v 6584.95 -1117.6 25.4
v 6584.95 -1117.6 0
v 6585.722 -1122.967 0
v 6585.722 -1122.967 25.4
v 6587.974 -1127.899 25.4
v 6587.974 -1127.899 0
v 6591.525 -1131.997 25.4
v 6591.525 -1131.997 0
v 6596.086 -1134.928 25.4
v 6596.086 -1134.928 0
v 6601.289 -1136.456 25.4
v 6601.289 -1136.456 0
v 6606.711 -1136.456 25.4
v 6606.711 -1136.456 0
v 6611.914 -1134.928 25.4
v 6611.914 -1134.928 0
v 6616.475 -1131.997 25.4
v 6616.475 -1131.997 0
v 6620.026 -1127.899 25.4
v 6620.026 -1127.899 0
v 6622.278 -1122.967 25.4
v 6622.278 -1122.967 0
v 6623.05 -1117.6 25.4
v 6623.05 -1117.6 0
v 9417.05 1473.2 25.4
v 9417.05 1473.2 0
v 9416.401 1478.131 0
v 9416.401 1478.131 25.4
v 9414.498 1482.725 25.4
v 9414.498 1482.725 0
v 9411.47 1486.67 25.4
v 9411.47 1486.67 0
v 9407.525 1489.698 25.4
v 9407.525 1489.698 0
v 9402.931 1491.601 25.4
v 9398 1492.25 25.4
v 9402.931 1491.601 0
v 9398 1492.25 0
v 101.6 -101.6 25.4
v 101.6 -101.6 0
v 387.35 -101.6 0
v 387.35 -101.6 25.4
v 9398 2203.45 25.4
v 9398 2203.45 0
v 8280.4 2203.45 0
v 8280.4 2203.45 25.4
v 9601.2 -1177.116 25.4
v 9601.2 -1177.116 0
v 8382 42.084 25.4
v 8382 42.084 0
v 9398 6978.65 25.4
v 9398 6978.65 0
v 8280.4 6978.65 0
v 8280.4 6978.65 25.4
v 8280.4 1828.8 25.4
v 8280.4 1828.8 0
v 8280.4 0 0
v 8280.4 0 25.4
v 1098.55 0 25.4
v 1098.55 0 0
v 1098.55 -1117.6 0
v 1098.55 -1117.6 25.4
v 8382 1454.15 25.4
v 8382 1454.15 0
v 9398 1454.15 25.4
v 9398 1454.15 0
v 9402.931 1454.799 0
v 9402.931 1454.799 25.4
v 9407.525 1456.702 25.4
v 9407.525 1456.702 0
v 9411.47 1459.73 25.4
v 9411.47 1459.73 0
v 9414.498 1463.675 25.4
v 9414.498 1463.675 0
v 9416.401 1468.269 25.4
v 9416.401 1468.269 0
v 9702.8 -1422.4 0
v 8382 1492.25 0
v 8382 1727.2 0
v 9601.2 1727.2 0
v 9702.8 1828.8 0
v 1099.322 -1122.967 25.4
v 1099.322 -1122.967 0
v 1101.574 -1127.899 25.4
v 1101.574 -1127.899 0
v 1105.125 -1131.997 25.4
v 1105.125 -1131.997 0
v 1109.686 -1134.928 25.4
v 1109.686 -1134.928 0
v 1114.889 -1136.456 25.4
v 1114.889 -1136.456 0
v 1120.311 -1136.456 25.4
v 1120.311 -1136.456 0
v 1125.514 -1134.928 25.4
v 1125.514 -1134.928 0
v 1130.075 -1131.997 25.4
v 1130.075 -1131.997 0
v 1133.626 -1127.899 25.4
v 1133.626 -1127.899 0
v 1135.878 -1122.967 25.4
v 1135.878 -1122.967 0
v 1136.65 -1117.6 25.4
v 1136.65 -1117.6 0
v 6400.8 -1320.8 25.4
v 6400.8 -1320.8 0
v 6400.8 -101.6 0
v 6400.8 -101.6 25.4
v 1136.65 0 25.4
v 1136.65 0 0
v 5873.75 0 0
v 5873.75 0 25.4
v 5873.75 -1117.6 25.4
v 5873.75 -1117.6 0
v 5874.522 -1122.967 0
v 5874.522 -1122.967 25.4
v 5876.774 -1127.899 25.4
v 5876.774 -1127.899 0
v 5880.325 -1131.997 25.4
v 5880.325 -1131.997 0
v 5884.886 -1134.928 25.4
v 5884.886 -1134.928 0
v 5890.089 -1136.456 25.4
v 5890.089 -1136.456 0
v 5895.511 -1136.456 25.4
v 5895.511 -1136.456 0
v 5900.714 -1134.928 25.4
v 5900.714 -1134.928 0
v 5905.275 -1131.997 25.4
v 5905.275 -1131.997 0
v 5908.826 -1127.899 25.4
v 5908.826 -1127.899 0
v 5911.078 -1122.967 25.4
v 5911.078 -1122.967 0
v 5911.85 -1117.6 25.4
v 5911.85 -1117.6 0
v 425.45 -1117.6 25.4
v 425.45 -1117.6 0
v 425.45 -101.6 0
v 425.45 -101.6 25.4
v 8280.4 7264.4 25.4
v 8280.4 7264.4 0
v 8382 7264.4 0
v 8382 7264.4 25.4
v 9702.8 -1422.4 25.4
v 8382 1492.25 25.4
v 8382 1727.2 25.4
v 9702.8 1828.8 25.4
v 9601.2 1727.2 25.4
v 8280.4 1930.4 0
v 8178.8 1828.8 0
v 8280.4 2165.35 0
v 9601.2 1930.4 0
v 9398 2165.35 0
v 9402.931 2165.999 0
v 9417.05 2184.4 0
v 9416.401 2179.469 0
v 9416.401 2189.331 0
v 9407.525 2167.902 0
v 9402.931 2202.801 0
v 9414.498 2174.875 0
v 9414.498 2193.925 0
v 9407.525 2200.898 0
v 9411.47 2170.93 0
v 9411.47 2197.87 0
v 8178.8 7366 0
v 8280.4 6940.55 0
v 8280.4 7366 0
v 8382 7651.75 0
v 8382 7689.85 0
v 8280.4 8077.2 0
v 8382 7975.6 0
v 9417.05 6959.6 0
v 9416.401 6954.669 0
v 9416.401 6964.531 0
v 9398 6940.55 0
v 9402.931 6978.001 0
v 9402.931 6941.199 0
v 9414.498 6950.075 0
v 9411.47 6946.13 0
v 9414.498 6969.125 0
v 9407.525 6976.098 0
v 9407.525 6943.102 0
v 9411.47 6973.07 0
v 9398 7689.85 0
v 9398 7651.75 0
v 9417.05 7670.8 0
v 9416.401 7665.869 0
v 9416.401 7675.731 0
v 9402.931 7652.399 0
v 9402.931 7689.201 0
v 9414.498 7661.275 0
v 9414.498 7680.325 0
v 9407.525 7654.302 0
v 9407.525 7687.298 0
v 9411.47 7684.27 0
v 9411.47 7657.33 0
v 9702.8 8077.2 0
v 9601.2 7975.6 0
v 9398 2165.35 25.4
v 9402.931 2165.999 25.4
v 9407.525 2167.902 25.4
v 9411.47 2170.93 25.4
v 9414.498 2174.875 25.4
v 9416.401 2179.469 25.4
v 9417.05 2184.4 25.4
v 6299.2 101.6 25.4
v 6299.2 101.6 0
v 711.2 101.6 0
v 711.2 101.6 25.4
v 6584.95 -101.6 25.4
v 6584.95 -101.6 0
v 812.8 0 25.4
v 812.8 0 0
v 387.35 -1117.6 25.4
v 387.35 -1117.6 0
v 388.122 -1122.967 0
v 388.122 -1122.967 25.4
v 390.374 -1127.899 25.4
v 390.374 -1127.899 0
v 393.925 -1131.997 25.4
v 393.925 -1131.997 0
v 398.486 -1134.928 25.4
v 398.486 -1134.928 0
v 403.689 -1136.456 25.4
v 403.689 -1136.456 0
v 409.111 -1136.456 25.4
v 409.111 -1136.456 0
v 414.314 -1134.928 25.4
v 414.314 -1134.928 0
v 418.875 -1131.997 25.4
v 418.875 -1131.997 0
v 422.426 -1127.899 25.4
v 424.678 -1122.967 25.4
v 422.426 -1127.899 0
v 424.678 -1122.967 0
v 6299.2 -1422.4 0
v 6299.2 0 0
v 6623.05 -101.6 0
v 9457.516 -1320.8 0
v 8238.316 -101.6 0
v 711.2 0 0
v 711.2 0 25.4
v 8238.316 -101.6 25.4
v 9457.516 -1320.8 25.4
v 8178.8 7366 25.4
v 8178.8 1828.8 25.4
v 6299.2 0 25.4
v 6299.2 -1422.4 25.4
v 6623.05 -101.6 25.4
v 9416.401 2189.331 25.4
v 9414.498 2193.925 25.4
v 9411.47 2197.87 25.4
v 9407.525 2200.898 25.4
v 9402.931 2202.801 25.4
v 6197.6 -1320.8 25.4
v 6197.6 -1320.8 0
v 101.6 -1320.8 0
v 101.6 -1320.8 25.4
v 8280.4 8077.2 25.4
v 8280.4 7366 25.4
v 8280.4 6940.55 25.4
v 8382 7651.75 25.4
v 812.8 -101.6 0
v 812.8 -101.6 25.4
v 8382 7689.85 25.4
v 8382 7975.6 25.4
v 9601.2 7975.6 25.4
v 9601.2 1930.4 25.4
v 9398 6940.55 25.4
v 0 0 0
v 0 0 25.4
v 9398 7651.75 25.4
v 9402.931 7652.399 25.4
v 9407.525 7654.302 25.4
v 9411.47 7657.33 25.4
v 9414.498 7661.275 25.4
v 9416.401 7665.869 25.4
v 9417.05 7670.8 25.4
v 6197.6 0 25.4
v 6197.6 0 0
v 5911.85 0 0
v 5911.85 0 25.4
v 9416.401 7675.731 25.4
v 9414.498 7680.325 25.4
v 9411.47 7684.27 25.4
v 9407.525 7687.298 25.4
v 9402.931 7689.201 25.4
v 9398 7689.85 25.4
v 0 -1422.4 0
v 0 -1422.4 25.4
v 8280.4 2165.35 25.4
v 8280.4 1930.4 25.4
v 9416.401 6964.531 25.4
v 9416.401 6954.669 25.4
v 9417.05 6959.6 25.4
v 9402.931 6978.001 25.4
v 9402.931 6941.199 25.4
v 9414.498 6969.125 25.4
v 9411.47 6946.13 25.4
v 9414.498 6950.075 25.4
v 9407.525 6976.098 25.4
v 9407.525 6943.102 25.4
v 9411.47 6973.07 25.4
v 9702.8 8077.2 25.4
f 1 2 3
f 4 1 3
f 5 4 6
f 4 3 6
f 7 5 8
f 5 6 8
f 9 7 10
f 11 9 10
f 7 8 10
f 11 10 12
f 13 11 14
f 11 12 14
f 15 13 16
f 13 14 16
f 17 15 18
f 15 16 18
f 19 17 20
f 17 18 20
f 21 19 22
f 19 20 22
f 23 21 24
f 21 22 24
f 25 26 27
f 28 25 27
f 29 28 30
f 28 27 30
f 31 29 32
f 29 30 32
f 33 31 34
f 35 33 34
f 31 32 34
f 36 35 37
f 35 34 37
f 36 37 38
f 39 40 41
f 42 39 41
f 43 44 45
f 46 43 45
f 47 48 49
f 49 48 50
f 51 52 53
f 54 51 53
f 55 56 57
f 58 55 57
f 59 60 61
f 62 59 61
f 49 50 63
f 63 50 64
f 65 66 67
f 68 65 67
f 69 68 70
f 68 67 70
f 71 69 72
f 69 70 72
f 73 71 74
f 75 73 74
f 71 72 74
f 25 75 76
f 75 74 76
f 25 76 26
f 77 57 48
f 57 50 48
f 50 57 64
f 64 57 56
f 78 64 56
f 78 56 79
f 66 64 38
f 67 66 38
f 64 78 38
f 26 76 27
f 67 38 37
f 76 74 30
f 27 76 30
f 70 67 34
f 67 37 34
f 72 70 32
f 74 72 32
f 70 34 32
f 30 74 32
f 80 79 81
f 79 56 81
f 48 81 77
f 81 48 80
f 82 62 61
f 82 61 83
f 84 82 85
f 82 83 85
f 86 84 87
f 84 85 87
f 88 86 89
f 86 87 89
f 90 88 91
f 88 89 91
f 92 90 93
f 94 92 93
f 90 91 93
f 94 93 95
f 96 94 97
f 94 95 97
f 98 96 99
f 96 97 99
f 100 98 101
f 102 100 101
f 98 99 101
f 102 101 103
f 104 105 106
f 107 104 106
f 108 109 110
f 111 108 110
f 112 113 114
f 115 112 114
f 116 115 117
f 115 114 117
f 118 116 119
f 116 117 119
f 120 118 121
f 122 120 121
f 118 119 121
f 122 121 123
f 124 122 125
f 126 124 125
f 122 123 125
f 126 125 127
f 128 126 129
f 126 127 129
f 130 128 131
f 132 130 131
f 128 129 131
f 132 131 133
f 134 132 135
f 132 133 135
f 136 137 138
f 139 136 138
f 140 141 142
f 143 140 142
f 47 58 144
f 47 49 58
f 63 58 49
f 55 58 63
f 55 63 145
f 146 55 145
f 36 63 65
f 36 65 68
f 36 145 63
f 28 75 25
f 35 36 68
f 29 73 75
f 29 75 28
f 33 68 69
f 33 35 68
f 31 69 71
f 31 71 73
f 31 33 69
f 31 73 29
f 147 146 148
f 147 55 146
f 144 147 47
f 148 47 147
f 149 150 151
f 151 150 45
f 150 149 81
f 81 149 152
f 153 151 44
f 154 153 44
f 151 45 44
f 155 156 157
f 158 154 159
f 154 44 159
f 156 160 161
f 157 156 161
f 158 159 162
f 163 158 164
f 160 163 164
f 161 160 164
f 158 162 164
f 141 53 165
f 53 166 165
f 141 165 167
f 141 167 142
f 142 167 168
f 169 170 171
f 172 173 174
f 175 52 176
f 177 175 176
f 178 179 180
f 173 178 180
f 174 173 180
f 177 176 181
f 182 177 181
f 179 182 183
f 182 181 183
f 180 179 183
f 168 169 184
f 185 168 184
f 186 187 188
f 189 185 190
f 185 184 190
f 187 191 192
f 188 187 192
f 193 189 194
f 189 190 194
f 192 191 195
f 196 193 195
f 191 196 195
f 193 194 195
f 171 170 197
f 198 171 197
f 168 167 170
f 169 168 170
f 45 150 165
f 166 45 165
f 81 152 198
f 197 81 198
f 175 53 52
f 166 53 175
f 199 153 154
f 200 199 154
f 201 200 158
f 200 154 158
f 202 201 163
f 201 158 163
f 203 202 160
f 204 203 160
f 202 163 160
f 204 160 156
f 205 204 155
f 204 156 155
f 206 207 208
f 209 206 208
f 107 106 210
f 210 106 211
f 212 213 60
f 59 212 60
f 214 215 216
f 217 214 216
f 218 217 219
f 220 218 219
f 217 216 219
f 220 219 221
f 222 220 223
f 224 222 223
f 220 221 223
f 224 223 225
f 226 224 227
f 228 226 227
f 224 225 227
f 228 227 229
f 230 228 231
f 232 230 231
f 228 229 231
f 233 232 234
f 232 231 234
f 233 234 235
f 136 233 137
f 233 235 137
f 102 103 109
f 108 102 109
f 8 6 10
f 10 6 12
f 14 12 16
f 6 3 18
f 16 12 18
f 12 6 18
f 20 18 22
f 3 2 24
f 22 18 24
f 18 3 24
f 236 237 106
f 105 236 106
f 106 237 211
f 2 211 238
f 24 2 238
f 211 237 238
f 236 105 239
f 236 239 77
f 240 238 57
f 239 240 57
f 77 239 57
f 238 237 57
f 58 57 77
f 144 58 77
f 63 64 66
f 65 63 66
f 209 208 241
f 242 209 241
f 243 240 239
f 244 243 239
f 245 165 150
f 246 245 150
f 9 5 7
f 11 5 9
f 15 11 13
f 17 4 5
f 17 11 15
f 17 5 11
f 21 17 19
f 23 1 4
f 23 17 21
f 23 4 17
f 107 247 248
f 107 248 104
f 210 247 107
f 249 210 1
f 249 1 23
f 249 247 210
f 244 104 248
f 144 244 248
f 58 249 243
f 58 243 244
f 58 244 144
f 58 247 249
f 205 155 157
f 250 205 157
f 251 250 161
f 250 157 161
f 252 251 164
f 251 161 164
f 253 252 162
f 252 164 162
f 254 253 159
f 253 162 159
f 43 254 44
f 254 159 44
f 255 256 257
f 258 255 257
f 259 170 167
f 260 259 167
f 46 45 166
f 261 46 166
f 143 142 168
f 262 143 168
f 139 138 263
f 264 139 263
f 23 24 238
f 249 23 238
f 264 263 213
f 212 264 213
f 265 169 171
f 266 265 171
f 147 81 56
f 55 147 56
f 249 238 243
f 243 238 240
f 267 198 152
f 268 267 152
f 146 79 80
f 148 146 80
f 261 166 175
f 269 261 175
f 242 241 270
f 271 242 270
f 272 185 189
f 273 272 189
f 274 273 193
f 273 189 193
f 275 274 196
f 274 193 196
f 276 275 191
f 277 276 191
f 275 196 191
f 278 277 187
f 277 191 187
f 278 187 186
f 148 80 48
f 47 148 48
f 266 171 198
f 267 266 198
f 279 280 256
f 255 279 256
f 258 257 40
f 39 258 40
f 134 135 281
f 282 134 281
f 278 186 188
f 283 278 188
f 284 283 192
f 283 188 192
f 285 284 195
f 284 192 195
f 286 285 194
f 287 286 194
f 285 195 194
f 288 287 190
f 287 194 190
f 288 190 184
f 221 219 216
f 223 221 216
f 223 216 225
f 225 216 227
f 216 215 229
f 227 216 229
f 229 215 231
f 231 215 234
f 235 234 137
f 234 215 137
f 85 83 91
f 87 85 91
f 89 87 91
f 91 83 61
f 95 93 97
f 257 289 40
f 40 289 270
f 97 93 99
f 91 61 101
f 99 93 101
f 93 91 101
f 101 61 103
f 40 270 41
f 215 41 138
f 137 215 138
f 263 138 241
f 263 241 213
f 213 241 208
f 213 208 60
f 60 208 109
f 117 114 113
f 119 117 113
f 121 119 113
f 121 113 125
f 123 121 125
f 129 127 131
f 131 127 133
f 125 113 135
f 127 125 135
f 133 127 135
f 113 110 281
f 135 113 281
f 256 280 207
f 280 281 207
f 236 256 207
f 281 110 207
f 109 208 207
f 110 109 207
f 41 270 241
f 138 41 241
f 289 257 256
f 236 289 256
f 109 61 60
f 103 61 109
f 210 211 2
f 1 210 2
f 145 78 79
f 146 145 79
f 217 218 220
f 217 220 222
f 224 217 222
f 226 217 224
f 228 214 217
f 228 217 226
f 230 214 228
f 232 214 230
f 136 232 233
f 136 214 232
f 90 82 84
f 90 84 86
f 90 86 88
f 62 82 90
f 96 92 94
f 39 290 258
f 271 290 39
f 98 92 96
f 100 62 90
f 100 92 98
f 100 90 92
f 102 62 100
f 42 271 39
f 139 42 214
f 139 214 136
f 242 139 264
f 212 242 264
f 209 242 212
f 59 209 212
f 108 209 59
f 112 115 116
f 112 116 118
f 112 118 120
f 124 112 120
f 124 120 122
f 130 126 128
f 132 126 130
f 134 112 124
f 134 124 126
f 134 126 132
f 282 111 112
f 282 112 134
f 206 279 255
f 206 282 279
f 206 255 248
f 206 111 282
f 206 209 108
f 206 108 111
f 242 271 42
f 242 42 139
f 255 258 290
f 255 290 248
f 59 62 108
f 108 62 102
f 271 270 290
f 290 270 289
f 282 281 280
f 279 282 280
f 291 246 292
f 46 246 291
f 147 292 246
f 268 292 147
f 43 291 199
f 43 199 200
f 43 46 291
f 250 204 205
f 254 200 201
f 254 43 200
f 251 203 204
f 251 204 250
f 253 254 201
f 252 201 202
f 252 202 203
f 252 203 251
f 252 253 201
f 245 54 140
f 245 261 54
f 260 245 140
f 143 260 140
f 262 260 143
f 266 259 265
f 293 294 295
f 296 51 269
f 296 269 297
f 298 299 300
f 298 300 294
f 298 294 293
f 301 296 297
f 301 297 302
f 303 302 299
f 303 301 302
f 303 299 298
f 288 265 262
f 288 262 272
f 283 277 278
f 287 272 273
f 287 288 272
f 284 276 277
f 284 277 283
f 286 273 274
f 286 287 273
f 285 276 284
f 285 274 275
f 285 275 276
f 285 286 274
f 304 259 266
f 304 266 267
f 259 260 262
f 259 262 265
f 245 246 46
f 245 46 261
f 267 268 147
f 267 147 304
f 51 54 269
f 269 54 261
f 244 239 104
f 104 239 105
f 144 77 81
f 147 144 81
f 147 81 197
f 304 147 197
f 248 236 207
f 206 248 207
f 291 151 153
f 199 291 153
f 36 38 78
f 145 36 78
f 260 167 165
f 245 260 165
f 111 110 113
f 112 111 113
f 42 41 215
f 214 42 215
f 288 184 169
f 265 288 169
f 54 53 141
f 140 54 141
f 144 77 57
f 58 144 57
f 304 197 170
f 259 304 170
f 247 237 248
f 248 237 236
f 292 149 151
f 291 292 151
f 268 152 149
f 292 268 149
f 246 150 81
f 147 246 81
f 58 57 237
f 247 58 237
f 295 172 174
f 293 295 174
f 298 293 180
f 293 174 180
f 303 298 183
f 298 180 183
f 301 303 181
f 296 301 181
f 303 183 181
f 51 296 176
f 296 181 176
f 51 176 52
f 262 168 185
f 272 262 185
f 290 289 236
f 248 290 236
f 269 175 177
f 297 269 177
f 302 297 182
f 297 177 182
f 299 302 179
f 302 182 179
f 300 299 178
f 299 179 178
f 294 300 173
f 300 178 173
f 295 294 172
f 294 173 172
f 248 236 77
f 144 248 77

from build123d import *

# Parameters (mm, degrees)
F1_DEPTH = 25.4
F2_DEPTH = 25.4
F3_DEPTH = 25.4
F4_DEPTH = 25.4


with BuildPart() as f1:
    # F0 (on Top) → F1 (new body)
    with BuildSketch(Plane.XY):
        Polygon((0, 0), (0, -1422.4), (6299.2, -1422.4), (6299.2, -1320.8), (6299.2, -101.6), (6299.2, 0), (6299.2, 101.6), (711.2, 101.6), (711.2, 0), align=None)
        Polygon((6197.6, -1320.8), (101.6, -1320.8), (101.6, -101.6), (387.35, -101.6), (425.45, -101.6), (812.8, -101.6), (812.8, 0), (1098.55, 0), (1136.65, 0), (5873.75, 0), (5911.85, 0), (6197.6, 0), (6197.6, -101.6), align=None, mode=Mode.SUBTRACT)
        with BuildLine():
            Line((425.45, -101.6), (387.35, -101.6))
            Line((387.35, -101.6), (387.35, -1117.6))
            ThreePointArc((387.35, -1117.6), (406.4, -1098.55), (425.45, -1117.6))
            Line((425.45, -1117.6), (425.45, -101.6))
        make_face()
        with BuildLine():
            ThreePointArc((425.45, -1117.6), (406.4, -1098.55), (387.35, -1117.6))
            Line((387.35, -1117.6), (425.45, -1117.6))
        make_face()
        with BuildLine():
            Line((425.45, -1117.6), (387.35, -1117.6))
            ThreePointArc((387.35, -1117.6), (406.4, -1136.65), (425.45, -1117.6))
        make_face()
        with BuildLine():
            Line((1136.65, -1117.6), (1136.65, 0))
            Line((1136.65, 0), (1098.55, 0))
            Line((1098.55, 0), (1098.55, -1117.6))
            ThreePointArc((1098.55, -1117.6), (1117.6, -1098.55), (1136.65, -1117.6))
        make_face()
        with BuildLine():
            Line((1098.55, -1117.6), (1136.65, -1117.6))
            ThreePointArc((1136.65, -1117.6), (1117.6, -1098.55), (1098.55, -1117.6))
        make_face()
        with BuildLine():
            ThreePointArc((1098.55, -1117.6), (1117.6, -1136.65), (1136.65, -1117.6))
            Line((1136.65, -1117.6), (1098.55, -1117.6))
        make_face()
        with BuildLine():
            Line((5911.85, -1117.6), (5911.85, 0))
            Line((5911.85, 0), (5873.75, 0))
            Line((5873.75, 0), (5873.75, -1117.6))
            ThreePointArc((5873.75, -1117.6), (5892.8, -1098.55), (5911.85, -1117.6))
        make_face()
        with BuildLine():
            Line((5873.75, -1117.6), (5911.85, -1117.6))
            ThreePointArc((5911.85, -1117.6), (5892.8, -1098.55), (5873.75, -1117.6))
        make_face()
        with BuildLine():
            ThreePointArc((5873.75, -1117.6), (5892.8, -1136.65), (5911.85, -1117.6))
            Line((5911.85, -1117.6), (5873.75, -1117.6))
        make_face()
    extrude(amount=F1_DEPTH)


with BuildPart() as f2:
    # F0 (on Top) → F2 (new body)
    with BuildSketch(Plane.XY):
        Polygon((6299.2, -1320.8), (6299.2, -1422.4), (9702.8, -1422.4), (8280.4, 0), (6400.8, 0), (6299.2, 0), (6299.2, -101.6), align=None)
        Polygon((6400.8, -101.6), (6584.95, -101.6), (6623.05, -101.6), (8238.315902, -101.6), (9457.515902, -1320.8), (6400.8, -1320.8), align=None, mode=Mode.SUBTRACT)
        with BuildLine():
            Line((6623.05, -101.6), (6584.95, -101.6))
            Line((6584.95, -101.6), (6584.95, -1117.6))
            ThreePointArc((6584.95, -1117.6), (6604, -1098.55), (6623.05, -1117.6))
            Line((6623.05, -1117.6), (6623.05, -101.6))
        make_face()
        with BuildLine():
            ThreePointArc((6623.05, -1117.6), (6604, -1098.55), (6584.95, -1117.6))
            Line((6584.95, -1117.6), (6623.05, -1117.6))
        make_face()
        with BuildLine():
            Line((6623.05, -1117.6), (6584.95, -1117.6))
            ThreePointArc((6584.95, -1117.6), (6604, -1136.65), (6623.05, -1117.6))
        make_face()
    extrude(amount=F2_DEPTH)


with BuildPart() as f3:
    # F0 (on Top) → F3 (new body)
    with BuildSketch(Plane.XY):
        Polygon((8280.4, 0), (9702.8, -1422.4), (9702.8, 1828.8), (8382, 1828.8), (8280.4, 1828.8), align=None)
        Polygon((9601.2, -1177.115902), (8382, 42.084098), (8382, 1454.15), (8382, 1492.25), (8382, 1727.2), (9601.2, 1727.2), align=None, mode=Mode.SUBTRACT)
        with BuildLine():
            Line((8382, 1492.25), (8382, 1454.15))
            Line((8382, 1454.15), (9398, 1454.15))
            ThreePointArc((9398, 1454.15), (9378.95, 1473.2), (9398, 1492.25))
            Line((9398, 1492.25), (8382, 1492.25))
        make_face()
        with BuildLine():
            ThreePointArc((9398, 1492.25), (9378.95, 1473.2), (9398, 1454.15))
            Line((9398, 1454.15), (9398, 1492.25))
        make_face()
        with BuildLine():
            Line((9398, 1492.25), (9398, 1454.15))
            ThreePointArc((9398, 1454.15), (9411.470384, 1459.729616), (9417.05, 1473.2))
            ThreePointArc((9417.05, 1473.2), (9411.470384, 1486.670384), (9398, 1492.25))
        make_face()
    extrude(amount=F3_DEPTH)


with BuildPart() as f4:
    # F0 (on Top) → F4 (new body)
    with BuildSketch(Plane.XY):
        Polygon((8382, 1828.8), (9702.8, 1828.8), (9702.8, 8077.2), (8280.4, 8077.2), (8280.4, 7366), (8178.8, 7366), (8178.8, 1828.8), (8280.4, 1828.8), align=None)
        Polygon((9601.2, 1930.4), (8382, 1930.4), (8280.4, 1930.4), (8280.4, 2165.35), (8280.4, 2203.45), (8280.4, 6940.55), (8280.4, 6978.65), (8280.4, 7264.4), (8382, 7264.4), (8382, 7651.75), (8382, 7689.85), (8382, 7975.6), (9601.2, 7975.6), align=None, mode=Mode.SUBTRACT)
        with BuildLine():
            Line((8280.4, 2203.45), (8280.4, 2165.35))
            Line((8280.4, 2165.35), (9398, 2165.35))
            ThreePointArc((9398, 2165.35), (9378.95, 2184.4), (9398, 2203.45))
            Line((9398, 2203.45), (8280.4, 2203.45))
        make_face()
        with BuildLine():
            ThreePointArc((9398, 2203.45), (9378.95, 2184.4), (9398, 2165.35))
            Line((9398, 2165.35), (9398, 2203.45))
        make_face()
        with BuildLine():
            Line((9398, 2203.45), (9398, 2165.35))
            ThreePointArc((9398, 2165.35), (9411.470384, 2170.929616), (9417.05, 2184.4))
            ThreePointArc((9417.05, 2184.4), (9411.470384, 2197.870384), (9398, 2203.45))
        make_face()
        with BuildLine():
            Line((8280.4, 6978.65), (8280.4, 6940.55))
            Line((8280.4, 6940.55), (9398, 6940.55))
            ThreePointArc((9398, 6940.55), (9378.95, 6959.6), (9398, 6978.65))
            Line((9398, 6978.65), (8280.4, 6978.65))
        make_face()
        with BuildLine():
            ThreePointArc((9398, 6978.65), (9378.95, 6959.6), (9398, 6940.55))
            Line((9398, 6940.55), (9398, 6978.65))
        make_face()
        with BuildLine():
            Line((9398, 6978.65), (9398, 6940.55))
            ThreePointArc((9398, 6940.55), (9411.470384, 6946.129616), (9417.05, 6959.6))
            ThreePointArc((9417.05, 6959.6), (9411.470384, 6973.070384), (9398, 6978.65))
        make_face()
        with BuildLine():
            Line((9398, 7689.85), (8382, 7689.85))
            Line((8382, 7689.85), (8382, 7651.75))
            Line((8382, 7651.75), (9398, 7651.75))
            ThreePointArc((9398, 7651.75), (9378.95, 7670.8), (9398, 7689.85))
        make_face()
        with BuildLine():
            Line((9398, 7651.75), (9398, 7689.85))
            ThreePointArc((9398, 7689.85), (9378.95, 7670.8), (9398, 7651.75))
        make_face()
        with BuildLine():
            ThreePointArc((9417.05, 7670.8), (9411.470384, 7684.270384), (9398, 7689.85))
            Line((9398, 7689.85), (9398, 7651.75))
            ThreePointArc((9398, 7651.75), (9411.470384, 7657.329616), (9417.05, 7670.8))
        make_face()
    extrude(amount=F4_DEPTH)


solid = Compound([f1.part, f2.part, f3.part, f4.part])
